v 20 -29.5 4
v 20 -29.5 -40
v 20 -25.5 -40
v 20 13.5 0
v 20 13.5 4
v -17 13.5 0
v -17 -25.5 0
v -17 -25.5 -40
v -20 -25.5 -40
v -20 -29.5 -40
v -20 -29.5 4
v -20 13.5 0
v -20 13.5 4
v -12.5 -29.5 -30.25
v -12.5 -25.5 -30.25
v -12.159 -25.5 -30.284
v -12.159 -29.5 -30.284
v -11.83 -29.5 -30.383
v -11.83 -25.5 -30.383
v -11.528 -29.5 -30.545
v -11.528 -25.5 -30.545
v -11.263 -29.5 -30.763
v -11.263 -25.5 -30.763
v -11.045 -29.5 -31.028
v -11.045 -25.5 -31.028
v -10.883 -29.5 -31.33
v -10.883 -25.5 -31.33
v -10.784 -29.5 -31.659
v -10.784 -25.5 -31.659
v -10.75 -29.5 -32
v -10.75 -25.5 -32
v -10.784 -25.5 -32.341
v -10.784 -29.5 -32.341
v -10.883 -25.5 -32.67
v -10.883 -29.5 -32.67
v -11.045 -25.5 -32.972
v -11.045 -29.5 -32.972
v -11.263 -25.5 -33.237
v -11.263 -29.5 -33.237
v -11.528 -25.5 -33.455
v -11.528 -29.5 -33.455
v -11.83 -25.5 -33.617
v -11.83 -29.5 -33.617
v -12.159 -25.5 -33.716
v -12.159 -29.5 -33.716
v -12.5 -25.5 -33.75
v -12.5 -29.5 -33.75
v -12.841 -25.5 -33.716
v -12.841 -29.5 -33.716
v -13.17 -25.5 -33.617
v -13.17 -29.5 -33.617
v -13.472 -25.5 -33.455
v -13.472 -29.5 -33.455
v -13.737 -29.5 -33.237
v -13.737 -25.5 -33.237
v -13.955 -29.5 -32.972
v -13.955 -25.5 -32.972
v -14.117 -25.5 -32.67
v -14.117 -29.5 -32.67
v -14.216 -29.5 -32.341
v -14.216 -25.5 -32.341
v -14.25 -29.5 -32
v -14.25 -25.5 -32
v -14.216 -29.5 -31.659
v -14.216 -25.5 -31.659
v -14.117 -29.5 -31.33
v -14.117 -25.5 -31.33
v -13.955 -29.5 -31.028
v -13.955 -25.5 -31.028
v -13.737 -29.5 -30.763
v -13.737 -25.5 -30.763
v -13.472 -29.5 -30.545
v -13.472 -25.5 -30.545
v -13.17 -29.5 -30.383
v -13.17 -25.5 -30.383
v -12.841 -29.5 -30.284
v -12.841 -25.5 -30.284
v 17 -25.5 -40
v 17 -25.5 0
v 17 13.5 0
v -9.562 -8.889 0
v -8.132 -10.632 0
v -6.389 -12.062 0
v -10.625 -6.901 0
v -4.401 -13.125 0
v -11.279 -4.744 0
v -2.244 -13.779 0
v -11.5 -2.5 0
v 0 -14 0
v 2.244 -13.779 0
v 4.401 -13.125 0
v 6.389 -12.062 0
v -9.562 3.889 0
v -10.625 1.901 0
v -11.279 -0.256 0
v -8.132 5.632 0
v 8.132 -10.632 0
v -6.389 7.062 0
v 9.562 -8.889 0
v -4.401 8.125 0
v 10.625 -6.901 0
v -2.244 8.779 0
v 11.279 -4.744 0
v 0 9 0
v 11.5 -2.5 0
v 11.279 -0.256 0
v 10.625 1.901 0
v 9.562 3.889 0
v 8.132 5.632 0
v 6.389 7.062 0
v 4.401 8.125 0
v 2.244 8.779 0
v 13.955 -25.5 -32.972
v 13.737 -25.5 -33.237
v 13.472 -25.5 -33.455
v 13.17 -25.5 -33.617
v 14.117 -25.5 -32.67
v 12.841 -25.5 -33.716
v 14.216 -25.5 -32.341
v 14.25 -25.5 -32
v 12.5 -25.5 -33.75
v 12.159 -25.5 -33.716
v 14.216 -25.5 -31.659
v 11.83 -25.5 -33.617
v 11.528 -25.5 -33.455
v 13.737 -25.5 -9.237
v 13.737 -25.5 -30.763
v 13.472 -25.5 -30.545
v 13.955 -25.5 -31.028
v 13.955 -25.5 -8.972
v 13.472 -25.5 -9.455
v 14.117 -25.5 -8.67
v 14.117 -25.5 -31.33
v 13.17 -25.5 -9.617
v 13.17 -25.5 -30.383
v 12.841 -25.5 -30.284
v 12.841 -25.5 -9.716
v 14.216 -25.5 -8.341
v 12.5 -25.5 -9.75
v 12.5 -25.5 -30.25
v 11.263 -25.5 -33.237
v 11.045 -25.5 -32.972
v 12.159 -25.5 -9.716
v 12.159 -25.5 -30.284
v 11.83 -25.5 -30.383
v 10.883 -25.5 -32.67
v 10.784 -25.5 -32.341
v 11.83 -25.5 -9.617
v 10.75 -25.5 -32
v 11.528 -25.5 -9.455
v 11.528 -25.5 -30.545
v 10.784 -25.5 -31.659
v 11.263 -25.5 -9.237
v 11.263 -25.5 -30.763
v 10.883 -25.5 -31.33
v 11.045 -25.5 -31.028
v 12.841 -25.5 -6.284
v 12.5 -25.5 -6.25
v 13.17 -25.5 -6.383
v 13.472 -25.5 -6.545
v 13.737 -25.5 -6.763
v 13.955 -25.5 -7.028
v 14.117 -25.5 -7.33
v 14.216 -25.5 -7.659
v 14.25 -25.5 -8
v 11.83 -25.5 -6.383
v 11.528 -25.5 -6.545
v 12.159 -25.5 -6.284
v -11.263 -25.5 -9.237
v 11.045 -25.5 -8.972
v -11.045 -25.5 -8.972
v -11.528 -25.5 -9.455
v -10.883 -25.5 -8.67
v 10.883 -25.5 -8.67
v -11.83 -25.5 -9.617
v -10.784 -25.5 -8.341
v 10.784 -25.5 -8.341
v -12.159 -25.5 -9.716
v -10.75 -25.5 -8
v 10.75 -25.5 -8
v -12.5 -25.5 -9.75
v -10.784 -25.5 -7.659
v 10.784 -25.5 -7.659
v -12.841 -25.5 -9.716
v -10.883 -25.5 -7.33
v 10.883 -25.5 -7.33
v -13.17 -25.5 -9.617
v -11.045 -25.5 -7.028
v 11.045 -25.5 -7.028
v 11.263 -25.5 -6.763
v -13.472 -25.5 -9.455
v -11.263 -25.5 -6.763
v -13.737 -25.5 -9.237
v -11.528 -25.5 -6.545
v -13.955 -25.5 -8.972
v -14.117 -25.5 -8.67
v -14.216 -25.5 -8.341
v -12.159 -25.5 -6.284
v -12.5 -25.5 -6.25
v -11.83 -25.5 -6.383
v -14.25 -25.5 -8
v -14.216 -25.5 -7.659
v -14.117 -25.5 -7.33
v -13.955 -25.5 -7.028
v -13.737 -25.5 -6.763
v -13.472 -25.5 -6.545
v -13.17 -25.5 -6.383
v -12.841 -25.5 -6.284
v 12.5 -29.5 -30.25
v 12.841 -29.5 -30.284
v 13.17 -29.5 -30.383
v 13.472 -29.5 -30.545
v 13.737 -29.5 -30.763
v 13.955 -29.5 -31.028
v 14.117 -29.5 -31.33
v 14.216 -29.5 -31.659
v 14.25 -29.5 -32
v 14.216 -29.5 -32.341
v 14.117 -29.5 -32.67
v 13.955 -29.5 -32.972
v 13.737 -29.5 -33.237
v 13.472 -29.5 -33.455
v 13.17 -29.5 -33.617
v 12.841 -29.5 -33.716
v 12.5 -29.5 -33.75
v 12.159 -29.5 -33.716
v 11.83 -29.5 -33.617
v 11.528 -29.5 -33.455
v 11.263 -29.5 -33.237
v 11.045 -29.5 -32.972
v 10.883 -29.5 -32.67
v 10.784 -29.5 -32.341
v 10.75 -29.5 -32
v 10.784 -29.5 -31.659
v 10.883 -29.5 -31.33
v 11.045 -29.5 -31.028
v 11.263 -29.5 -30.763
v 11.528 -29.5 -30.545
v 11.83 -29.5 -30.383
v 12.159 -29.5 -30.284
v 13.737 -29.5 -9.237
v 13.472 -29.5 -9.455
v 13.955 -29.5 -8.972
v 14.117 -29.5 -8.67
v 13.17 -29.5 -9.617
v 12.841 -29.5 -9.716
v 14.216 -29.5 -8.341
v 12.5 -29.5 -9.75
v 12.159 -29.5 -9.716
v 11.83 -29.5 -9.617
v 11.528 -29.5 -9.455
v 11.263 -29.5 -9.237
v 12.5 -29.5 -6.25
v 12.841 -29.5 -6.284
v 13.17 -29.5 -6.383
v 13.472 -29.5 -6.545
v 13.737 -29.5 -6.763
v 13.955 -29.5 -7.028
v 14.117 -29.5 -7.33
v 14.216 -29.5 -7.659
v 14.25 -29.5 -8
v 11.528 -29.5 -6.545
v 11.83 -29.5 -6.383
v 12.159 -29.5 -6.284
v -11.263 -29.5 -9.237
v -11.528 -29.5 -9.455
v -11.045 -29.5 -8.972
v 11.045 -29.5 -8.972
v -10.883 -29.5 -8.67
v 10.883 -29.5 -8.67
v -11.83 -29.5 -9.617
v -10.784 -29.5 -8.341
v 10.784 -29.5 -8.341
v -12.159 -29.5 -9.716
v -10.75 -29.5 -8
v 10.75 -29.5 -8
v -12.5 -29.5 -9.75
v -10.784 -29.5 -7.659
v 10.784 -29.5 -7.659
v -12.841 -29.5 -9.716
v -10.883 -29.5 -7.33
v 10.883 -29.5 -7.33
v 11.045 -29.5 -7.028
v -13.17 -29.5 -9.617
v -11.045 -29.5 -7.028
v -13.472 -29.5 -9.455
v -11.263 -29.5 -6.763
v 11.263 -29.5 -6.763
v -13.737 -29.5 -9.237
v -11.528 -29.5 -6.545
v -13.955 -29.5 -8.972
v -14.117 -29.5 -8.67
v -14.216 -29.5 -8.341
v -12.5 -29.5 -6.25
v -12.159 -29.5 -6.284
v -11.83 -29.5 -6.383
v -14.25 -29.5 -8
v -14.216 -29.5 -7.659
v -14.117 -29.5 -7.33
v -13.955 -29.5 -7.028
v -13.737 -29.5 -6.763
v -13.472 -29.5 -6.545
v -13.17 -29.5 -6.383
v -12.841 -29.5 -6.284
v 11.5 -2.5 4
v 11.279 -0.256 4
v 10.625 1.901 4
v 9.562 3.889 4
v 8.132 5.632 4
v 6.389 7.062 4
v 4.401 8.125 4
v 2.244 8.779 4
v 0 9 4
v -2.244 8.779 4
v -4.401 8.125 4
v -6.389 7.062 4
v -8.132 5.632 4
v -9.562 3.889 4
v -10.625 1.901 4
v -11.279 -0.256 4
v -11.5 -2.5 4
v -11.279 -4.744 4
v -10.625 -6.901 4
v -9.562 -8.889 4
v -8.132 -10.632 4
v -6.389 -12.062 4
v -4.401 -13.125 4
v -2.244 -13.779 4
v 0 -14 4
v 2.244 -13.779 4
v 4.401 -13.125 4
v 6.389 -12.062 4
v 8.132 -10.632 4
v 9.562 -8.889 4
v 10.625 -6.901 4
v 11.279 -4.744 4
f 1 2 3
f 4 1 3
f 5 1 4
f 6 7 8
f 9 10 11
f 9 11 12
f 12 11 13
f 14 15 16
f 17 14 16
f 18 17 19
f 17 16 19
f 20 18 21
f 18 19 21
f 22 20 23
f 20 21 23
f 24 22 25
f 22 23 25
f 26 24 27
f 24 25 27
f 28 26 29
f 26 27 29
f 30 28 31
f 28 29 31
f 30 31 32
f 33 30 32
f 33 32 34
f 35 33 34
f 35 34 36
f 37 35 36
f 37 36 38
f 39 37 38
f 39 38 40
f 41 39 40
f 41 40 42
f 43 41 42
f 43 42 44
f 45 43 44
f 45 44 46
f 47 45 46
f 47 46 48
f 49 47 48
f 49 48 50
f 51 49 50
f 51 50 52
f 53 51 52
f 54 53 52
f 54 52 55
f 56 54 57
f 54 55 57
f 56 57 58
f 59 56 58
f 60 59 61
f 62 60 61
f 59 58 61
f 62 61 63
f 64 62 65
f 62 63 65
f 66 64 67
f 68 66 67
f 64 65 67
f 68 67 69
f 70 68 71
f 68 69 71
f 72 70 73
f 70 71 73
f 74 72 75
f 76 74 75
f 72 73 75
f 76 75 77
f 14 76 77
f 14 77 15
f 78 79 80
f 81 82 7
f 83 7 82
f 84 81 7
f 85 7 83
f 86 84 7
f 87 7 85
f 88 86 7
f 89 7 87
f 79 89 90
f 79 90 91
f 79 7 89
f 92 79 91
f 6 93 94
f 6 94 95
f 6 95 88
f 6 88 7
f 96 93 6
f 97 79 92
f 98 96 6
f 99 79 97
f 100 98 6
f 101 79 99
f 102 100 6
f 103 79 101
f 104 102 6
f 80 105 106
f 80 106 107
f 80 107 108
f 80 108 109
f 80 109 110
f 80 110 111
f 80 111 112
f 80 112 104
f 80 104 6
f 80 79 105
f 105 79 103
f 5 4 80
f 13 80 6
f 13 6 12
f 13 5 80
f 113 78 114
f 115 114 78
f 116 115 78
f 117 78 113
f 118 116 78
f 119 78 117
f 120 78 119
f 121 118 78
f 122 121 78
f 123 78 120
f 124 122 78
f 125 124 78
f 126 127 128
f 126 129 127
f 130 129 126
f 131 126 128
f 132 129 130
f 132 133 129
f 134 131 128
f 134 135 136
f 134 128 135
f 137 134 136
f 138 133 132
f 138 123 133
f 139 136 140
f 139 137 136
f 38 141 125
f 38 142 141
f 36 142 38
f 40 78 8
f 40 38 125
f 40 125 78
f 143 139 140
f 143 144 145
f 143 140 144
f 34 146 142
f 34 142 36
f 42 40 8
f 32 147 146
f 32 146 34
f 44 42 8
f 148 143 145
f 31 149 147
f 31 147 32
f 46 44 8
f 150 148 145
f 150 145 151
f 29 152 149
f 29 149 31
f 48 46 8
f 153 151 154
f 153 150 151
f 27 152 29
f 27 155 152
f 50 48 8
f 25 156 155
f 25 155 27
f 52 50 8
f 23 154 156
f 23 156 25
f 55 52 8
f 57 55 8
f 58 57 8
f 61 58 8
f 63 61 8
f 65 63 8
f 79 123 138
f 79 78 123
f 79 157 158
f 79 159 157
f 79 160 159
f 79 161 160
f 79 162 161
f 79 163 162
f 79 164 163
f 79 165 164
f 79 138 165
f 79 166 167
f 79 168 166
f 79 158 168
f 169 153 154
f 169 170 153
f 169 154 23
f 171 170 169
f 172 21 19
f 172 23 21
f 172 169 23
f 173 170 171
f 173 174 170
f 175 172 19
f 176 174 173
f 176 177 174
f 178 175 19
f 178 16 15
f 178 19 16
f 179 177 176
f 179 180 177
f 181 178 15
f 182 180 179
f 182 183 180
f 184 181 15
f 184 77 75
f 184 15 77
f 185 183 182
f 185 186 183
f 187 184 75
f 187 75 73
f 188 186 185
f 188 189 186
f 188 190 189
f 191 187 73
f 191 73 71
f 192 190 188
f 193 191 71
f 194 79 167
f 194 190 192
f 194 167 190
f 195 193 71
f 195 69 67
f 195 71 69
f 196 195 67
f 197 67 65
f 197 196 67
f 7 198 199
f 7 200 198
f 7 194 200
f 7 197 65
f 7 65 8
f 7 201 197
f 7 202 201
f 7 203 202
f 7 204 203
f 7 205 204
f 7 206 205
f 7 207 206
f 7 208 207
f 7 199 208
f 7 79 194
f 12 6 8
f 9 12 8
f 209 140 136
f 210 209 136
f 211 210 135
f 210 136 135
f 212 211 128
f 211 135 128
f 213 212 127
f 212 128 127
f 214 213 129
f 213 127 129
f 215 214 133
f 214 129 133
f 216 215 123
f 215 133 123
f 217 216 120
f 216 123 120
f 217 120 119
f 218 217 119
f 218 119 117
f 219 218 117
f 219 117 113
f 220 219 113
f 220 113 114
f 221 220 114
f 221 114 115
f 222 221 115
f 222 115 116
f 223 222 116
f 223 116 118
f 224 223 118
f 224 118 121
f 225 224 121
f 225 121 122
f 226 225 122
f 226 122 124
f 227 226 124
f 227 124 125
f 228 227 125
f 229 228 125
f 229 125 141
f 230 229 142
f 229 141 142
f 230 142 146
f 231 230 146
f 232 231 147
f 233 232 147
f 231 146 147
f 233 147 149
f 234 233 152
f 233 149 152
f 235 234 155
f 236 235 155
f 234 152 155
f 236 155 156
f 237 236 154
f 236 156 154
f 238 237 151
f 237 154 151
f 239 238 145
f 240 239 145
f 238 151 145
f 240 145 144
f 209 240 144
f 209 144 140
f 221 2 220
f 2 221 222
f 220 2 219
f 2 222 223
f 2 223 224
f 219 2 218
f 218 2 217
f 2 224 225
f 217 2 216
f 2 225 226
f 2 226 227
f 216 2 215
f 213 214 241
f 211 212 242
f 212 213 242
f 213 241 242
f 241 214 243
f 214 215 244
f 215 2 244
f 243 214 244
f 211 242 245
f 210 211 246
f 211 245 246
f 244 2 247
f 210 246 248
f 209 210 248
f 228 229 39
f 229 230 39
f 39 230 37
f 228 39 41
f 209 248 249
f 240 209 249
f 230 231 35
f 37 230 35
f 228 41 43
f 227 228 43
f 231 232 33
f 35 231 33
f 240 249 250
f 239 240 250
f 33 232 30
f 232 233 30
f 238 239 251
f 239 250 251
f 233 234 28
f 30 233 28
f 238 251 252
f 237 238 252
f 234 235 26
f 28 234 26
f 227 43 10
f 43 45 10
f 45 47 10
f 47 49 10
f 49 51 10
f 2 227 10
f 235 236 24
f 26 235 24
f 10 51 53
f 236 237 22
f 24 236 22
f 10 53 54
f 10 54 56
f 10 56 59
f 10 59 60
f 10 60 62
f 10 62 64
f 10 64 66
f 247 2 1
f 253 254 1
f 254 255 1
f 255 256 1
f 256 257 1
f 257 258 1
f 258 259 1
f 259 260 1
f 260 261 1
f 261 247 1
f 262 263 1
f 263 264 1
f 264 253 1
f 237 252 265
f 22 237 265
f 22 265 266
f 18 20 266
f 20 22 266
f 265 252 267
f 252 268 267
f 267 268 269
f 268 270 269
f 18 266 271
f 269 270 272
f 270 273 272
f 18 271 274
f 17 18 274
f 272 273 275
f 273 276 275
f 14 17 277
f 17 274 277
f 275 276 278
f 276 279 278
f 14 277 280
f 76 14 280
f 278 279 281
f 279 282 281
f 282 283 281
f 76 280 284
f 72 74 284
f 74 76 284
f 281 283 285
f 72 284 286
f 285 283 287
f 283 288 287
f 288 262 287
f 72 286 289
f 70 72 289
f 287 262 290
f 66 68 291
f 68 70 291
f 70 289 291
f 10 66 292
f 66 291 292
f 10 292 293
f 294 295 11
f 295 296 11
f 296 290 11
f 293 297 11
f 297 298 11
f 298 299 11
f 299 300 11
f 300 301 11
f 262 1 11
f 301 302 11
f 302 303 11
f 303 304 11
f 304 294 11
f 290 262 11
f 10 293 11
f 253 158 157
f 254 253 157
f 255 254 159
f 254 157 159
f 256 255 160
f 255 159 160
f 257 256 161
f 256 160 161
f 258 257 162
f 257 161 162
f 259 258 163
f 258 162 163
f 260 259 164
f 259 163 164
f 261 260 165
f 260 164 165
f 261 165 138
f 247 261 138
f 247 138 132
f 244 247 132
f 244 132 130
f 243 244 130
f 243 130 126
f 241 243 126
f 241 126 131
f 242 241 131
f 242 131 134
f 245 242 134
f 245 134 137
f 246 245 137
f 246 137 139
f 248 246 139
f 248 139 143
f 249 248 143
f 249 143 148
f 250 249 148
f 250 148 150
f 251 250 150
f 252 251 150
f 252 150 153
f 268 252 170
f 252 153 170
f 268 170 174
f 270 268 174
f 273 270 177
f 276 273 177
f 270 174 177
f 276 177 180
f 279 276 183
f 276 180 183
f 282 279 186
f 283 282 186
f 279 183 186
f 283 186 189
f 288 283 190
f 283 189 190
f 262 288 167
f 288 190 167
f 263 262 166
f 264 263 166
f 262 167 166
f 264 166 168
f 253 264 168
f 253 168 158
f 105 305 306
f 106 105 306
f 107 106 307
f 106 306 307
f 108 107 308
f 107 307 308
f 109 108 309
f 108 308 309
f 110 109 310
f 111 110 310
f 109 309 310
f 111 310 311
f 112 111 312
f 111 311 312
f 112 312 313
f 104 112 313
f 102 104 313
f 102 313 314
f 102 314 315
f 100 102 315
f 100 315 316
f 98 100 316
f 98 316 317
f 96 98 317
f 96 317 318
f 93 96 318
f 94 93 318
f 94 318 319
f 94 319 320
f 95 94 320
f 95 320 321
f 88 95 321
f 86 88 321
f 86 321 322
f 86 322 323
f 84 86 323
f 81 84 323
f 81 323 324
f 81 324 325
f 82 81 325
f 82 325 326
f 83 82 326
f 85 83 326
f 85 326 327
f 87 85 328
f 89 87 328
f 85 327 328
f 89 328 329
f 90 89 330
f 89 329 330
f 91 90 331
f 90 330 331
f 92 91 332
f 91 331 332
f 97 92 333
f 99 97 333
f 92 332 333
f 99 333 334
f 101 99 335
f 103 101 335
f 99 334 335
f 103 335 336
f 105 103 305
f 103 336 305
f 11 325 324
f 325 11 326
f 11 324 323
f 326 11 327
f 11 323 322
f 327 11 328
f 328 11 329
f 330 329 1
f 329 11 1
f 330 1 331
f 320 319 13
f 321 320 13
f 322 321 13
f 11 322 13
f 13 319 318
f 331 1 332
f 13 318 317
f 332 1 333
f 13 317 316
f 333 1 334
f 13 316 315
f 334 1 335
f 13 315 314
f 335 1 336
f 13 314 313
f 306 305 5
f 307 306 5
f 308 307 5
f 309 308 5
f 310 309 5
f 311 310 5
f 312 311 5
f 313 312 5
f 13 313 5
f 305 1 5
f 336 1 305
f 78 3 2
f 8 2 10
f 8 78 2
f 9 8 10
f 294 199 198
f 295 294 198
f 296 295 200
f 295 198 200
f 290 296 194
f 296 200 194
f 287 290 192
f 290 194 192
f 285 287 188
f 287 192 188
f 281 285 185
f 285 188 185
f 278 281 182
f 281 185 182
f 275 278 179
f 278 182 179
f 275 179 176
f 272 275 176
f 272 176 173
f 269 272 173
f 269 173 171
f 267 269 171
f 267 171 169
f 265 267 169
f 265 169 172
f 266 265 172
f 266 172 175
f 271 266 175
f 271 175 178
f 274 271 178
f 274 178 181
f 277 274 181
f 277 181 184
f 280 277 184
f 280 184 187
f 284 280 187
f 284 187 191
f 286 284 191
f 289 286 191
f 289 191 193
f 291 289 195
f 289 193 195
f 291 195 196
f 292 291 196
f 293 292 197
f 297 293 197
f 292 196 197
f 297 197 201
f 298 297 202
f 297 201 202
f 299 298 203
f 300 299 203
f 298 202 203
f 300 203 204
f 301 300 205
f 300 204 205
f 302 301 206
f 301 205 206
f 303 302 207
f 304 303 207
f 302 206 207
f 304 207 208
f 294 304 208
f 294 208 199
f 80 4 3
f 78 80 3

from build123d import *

# Parameters (mm, degrees)
SKETCH_1_W           = 34
SKETCH_1_H           = 51
EXTRUDE_1_DEPTH      = 4
SKETCH_2_R           = 11.5
CUT_EXTRUDE_1_DEPTH  = 31.907118921
SKETCH_5_W           = 34
SKETCH_5_H           = 15
EXTRUDE_2_DEPTH      = 4
SKETCH_6_R           = 1.5
CUT_EXTRUDE_3_DEPTH  = 4
SKETCH_12_W          = 34
SKETCH_12_H          = 4
CUT_EXTRUDE_5_DEPTH  = 5
SKETCH_13_W          = 34
SKETCH_13_H          = 4
CUT_EXTRUDE_6_DEPTH  = 7
SKETCH_14_W          = 34
SKETCH_14_H          = 4
EXTRUDE_3_DEPTH      = 33
SKETCH_15_R          = 1.75
CUT_EXTRUDE_7_DEPTH  = 44
EXTRUDE_4_DEPTH      = 3
EXTRUDE_5_DEPTH      = 3
SKETCH_18_R          = 1.75
EXTRUDE_6_DEPTH      = 4
EXTRUDE_7_DEPTH      = 5
SKETCH_20_W          = 63.510352062
SKETCH_20_H          = 72.285945639
CUT_EXTRUDE_10_DEPTH = 67
SKETCH_21_W          = 4
SKETCH_21_H          = 43
EXTRUDE_8_DEPTH      = 3
SKETCH_22_W          = 4
SKETCH_22_H          = 43
EXTRUDE_9_DEPTH      = 3
SKETCH_23_W          = 40
SKETCH_23_H          = 4
EXTRUDE_10_DEPTH     = 40
SKETCH_24_W          = 3
SKETCH_24_H          = 39
EXTRUDE_11_DEPTH     = 40
CUT_EXTRUDE_11_DEPTH = 72.5
SKETCH_26_R          = 1.75
CUT_EXTRUDE_12_DEPTH = 5


with BuildPart() as part:
    # 草图1 → 凸台-拉伸1 (new body)
    with BuildSketch(Plane.XY):
        Rectangle(SKETCH_1_W, SKETCH_1_H)
    extrude(amount=EXTRUDE_1_DEPTH)

    # 草图2 → 切除-拉伸1 (cut, through all)
    with BuildSketch(Plane.XY.offset(4)):
        with Locations((0, -2.5)):
            Circle(SKETCH_2_R)
    extrude(amount=-CUT_EXTRUDE_1_DEPTH, mode=Mode.SUBTRACT)

    # 草图5 → 凸台-拉伸2 (add)
    with BuildSketch(Plane.XZ.offset(25.5)):
        with Locations((0, 7.5)):
            Rectangle(SKETCH_5_W, SKETCH_5_H)
    extrude(amount=EXTRUDE_2_DEPTH)

    # 草图6 → 切除-拉伸3 (cut)
    with BuildSketch(Plane.XZ.offset(29.5)):
        with Locations(Location((13, 7.5, 0), (0, 0, 270))):
            Circle(SKETCH_6_R)
        with Locations(Location((-13, 7.5, 0), (0, 0, 90))):
            Circle(SKETCH_6_R)
    extrude(amount=-CUT_EXTRUDE_3_DEPTH, mode=Mode.SUBTRACT)

    # 草图12 → 切除-拉伸5 (cut)
    with BuildSketch(Plane(origin=(0, 25.5, 0), x_dir=(1, 0, 0), z_dir=(0, 1, 0))):
        with Locations((0, -2)):
            Rectangle(SKETCH_12_W, SKETCH_12_H)
    extrude(amount=-CUT_EXTRUDE_5_DEPTH, mode=Mode.SUBTRACT)

    # 草图13 → 切除-拉伸6 (cut)
    with BuildSketch(Plane(origin=(0, 20.5, 0), x_dir=(1, 0, 0), z_dir=(0, 1, 0))):
        with Locations((0, -2)):
            Rectangle(SKETCH_13_W, SKETCH_13_H)
    extrude(amount=-CUT_EXTRUDE_6_DEPTH, mode=Mode.SUBTRACT)

    # 草图14 → 凸台-拉伸3 (add)
    with BuildSketch(Plane.XY.offset(15)):
        with Locations((0, -27.5)):
            Rectangle(SKETCH_14_W, SKETCH_14_H)
    extrude(amount=EXTRUDE_3_DEPTH)

    # 草图15 → 切除-拉伸7 (cut)
    with BuildSketch(Plane(origin=(0, -25.5, 0), x_dir=(1, 0, 0), z_dir=(0, 1, 0))):
        with Locations(Location((13, -40.5, 0), (0, 0, 270))):
            Circle(SKETCH_15_R)
        with Locations(Location((-13, -40.5, 0), (0, 0, 270))):
            Circle(SKETCH_15_R)
    extrude(amount=-CUT_EXTRUDE_7_DEPTH, mode=Mode.SUBTRACT)

    # 草图16 → 凸台-拉伸4 (add)
    with BuildSketch(Plane.ZY.offset(17)):
        Polygon((4, -25.5), (4, -6), (24, -25.5), align=None)
    extrude(amount=-EXTRUDE_4_DEPTH)

    # 草图17 → 凸台-拉伸5 (add)
    with BuildSketch(Plane(origin=(17, 0, 0), x_dir=(0, 0, -1), z_dir=(1, 0, 0))):
        Polygon((-24, -25.5), (-4, -6), (-4, -25.5), align=None)
    extrude(amount=-EXTRUDE_5_DEPTH)

    # 草图18 → 凸台-拉伸6 (add)
    with BuildSketch(Plane(origin=(0, -25.5, 0), x_dir=(1, 0, 0), z_dir=(0, 1, 0))):
        with BuildLine():
            Line((20.499000769, -32.499999751), (17, -24))
            Line((17, -24), (-17, -24))
            Line((-17, -24), (-20.500999231, -32.499999751))
            Line((-20.500999231, -32.499999751), (-20.500999231, -40.499999751))
            ThreePointArc((-20.500999231, -40.499999751), (-17.718513652, -47.217514172), (-11.000999231, -49.999999751))
            Line((-11.000999231, -49.999999751), (10.999000769, -49.999999751))
            ThreePointArc((10.999000769, -49.999999751), (17.71651519, -47.217514172), (20.499000769, -40.499999751))
            Line((20.499000769, -40.499999751), (20.499000769, -32.499999751))
        make_face()
        with Locations(Location((-13, -40.5, 0), (0, 0, 270))):
            Circle(SKETCH_18_R, mode=Mode.SUBTRACT)
        with Locations(Location((13, -40.5, 0), (0, 0, 270))):
            Circle(SKETCH_18_R, mode=Mode.SUBTRACT)
    extrude(amount=-EXTRUDE_6_DEPTH)

    # 草图19 → 凸台-拉伸7 (add)
    with BuildSketch(Plane(origin=(0, -25.5, 0), x_dir=(1, 0, 0), z_dir=(0, 1, 0))):
        Polygon((-20.500999231, -32.499999751), (-17.500999231, -32.499999751), (-14, -24), (-14, -16), (-17, -16), (-17, -24), align=None)
        Polygon((17, -24), (20.499000769, -32.499999751), (17.499000769, -32.499999751), (14, -24), (14, -16), (17, -16), align=None)
    extrude(amount=EXTRUDE_7_DEPTH)

    # 草图20 → 切除-拉伸10 (cut)
    with BuildSketch(Plane.XY.offset(4)):
        with Locations((0, -7.757033155)):
            Rectangle(SKETCH_20_W, SKETCH_20_H)
    extrude(amount=CUT_EXTRUDE_10_DEPTH, mode=Mode.SUBTRACT)

    # 草图21 → 凸台-拉伸8 (add)
    with BuildSketch(Plane(origin=(17, 0, 0), x_dir=(0, 0, -1), z_dir=(1, 0, 0))):
        with Locations((-2, -8)):
            Rectangle(SKETCH_21_W, SKETCH_21_H)
    extrude(amount=EXTRUDE_8_DEPTH)

    # 草图22 → 凸台-拉伸9 (add)
    with BuildSketch(Plane.ZY.offset(17)):
        with Locations((2, -8)):
            Rectangle(SKETCH_22_W, SKETCH_22_H)
    extrude(amount=EXTRUDE_9_DEPTH)

    # 草图23 → 凸台-拉伸10 (add)
    with BuildSketch(Plane(origin=(0, 0, 0), x_dir=(-1, 0, 0), z_dir=(0, 0, -1))):
        with Locations((0, -27.5)):
            Rectangle(SKETCH_23_W, SKETCH_23_H)
    extrude(amount=EXTRUDE_10_DEPTH)

    # 草图24 → 凸台-拉伸11 (add)
    with BuildSketch(Plane(origin=(0, 0, 0), x_dir=(-1, 0, 0), z_dir=(0, 0, -1))):
        with Locations((18.5, -6)):
            Rectangle(SKETCH_24_W, SKETCH_24_H)
        with Locations((-18.5, -6)):
            Rectangle(SKETCH_24_W, SKETCH_24_H)
    extrude(amount=EXTRUDE_11_DEPTH)

    # 草图25 → 切除-拉伸11 (cut, symmetric)
    with BuildSketch(Plane(origin=(-17, 0, 0), x_dir=(0, 0, -1), z_dir=(1, 0, 0))):
        Polygon((0, 13.5), (40, -25.5), (40, 13.5), align=None)
    extrude(amount=CUT_EXTRUDE_11_DEPTH, both=True, mode=Mode.SUBTRACT)

    # 草图26 → 切除-拉伸12 (cut)
    with BuildSketch(Plane(origin=(0, -25.5, 0), x_dir=(1, 0, 0), z_dir=(0, 1, 0))):
        with Locations(Location((-12.5, 32, 0), (0, 0, 270))):
            Circle(SKETCH_26_R)
        with Locations(Location((12.5, 32, 0), (0, 0, 270))):
            Circle(SKETCH_26_R)
        with Locations(Location((12.5, 8, 0), (0, 0, 270))):
            Circle(SKETCH_26_R)
        with Locations(Location((-12.5, 8, 0), (0, 0, 270))):
            Circle(SKETCH_26_R)
    extrude(amount=-CUT_EXTRUDE_12_DEPTH, mode=Mode.SUBTRACT)


solid = part.part
